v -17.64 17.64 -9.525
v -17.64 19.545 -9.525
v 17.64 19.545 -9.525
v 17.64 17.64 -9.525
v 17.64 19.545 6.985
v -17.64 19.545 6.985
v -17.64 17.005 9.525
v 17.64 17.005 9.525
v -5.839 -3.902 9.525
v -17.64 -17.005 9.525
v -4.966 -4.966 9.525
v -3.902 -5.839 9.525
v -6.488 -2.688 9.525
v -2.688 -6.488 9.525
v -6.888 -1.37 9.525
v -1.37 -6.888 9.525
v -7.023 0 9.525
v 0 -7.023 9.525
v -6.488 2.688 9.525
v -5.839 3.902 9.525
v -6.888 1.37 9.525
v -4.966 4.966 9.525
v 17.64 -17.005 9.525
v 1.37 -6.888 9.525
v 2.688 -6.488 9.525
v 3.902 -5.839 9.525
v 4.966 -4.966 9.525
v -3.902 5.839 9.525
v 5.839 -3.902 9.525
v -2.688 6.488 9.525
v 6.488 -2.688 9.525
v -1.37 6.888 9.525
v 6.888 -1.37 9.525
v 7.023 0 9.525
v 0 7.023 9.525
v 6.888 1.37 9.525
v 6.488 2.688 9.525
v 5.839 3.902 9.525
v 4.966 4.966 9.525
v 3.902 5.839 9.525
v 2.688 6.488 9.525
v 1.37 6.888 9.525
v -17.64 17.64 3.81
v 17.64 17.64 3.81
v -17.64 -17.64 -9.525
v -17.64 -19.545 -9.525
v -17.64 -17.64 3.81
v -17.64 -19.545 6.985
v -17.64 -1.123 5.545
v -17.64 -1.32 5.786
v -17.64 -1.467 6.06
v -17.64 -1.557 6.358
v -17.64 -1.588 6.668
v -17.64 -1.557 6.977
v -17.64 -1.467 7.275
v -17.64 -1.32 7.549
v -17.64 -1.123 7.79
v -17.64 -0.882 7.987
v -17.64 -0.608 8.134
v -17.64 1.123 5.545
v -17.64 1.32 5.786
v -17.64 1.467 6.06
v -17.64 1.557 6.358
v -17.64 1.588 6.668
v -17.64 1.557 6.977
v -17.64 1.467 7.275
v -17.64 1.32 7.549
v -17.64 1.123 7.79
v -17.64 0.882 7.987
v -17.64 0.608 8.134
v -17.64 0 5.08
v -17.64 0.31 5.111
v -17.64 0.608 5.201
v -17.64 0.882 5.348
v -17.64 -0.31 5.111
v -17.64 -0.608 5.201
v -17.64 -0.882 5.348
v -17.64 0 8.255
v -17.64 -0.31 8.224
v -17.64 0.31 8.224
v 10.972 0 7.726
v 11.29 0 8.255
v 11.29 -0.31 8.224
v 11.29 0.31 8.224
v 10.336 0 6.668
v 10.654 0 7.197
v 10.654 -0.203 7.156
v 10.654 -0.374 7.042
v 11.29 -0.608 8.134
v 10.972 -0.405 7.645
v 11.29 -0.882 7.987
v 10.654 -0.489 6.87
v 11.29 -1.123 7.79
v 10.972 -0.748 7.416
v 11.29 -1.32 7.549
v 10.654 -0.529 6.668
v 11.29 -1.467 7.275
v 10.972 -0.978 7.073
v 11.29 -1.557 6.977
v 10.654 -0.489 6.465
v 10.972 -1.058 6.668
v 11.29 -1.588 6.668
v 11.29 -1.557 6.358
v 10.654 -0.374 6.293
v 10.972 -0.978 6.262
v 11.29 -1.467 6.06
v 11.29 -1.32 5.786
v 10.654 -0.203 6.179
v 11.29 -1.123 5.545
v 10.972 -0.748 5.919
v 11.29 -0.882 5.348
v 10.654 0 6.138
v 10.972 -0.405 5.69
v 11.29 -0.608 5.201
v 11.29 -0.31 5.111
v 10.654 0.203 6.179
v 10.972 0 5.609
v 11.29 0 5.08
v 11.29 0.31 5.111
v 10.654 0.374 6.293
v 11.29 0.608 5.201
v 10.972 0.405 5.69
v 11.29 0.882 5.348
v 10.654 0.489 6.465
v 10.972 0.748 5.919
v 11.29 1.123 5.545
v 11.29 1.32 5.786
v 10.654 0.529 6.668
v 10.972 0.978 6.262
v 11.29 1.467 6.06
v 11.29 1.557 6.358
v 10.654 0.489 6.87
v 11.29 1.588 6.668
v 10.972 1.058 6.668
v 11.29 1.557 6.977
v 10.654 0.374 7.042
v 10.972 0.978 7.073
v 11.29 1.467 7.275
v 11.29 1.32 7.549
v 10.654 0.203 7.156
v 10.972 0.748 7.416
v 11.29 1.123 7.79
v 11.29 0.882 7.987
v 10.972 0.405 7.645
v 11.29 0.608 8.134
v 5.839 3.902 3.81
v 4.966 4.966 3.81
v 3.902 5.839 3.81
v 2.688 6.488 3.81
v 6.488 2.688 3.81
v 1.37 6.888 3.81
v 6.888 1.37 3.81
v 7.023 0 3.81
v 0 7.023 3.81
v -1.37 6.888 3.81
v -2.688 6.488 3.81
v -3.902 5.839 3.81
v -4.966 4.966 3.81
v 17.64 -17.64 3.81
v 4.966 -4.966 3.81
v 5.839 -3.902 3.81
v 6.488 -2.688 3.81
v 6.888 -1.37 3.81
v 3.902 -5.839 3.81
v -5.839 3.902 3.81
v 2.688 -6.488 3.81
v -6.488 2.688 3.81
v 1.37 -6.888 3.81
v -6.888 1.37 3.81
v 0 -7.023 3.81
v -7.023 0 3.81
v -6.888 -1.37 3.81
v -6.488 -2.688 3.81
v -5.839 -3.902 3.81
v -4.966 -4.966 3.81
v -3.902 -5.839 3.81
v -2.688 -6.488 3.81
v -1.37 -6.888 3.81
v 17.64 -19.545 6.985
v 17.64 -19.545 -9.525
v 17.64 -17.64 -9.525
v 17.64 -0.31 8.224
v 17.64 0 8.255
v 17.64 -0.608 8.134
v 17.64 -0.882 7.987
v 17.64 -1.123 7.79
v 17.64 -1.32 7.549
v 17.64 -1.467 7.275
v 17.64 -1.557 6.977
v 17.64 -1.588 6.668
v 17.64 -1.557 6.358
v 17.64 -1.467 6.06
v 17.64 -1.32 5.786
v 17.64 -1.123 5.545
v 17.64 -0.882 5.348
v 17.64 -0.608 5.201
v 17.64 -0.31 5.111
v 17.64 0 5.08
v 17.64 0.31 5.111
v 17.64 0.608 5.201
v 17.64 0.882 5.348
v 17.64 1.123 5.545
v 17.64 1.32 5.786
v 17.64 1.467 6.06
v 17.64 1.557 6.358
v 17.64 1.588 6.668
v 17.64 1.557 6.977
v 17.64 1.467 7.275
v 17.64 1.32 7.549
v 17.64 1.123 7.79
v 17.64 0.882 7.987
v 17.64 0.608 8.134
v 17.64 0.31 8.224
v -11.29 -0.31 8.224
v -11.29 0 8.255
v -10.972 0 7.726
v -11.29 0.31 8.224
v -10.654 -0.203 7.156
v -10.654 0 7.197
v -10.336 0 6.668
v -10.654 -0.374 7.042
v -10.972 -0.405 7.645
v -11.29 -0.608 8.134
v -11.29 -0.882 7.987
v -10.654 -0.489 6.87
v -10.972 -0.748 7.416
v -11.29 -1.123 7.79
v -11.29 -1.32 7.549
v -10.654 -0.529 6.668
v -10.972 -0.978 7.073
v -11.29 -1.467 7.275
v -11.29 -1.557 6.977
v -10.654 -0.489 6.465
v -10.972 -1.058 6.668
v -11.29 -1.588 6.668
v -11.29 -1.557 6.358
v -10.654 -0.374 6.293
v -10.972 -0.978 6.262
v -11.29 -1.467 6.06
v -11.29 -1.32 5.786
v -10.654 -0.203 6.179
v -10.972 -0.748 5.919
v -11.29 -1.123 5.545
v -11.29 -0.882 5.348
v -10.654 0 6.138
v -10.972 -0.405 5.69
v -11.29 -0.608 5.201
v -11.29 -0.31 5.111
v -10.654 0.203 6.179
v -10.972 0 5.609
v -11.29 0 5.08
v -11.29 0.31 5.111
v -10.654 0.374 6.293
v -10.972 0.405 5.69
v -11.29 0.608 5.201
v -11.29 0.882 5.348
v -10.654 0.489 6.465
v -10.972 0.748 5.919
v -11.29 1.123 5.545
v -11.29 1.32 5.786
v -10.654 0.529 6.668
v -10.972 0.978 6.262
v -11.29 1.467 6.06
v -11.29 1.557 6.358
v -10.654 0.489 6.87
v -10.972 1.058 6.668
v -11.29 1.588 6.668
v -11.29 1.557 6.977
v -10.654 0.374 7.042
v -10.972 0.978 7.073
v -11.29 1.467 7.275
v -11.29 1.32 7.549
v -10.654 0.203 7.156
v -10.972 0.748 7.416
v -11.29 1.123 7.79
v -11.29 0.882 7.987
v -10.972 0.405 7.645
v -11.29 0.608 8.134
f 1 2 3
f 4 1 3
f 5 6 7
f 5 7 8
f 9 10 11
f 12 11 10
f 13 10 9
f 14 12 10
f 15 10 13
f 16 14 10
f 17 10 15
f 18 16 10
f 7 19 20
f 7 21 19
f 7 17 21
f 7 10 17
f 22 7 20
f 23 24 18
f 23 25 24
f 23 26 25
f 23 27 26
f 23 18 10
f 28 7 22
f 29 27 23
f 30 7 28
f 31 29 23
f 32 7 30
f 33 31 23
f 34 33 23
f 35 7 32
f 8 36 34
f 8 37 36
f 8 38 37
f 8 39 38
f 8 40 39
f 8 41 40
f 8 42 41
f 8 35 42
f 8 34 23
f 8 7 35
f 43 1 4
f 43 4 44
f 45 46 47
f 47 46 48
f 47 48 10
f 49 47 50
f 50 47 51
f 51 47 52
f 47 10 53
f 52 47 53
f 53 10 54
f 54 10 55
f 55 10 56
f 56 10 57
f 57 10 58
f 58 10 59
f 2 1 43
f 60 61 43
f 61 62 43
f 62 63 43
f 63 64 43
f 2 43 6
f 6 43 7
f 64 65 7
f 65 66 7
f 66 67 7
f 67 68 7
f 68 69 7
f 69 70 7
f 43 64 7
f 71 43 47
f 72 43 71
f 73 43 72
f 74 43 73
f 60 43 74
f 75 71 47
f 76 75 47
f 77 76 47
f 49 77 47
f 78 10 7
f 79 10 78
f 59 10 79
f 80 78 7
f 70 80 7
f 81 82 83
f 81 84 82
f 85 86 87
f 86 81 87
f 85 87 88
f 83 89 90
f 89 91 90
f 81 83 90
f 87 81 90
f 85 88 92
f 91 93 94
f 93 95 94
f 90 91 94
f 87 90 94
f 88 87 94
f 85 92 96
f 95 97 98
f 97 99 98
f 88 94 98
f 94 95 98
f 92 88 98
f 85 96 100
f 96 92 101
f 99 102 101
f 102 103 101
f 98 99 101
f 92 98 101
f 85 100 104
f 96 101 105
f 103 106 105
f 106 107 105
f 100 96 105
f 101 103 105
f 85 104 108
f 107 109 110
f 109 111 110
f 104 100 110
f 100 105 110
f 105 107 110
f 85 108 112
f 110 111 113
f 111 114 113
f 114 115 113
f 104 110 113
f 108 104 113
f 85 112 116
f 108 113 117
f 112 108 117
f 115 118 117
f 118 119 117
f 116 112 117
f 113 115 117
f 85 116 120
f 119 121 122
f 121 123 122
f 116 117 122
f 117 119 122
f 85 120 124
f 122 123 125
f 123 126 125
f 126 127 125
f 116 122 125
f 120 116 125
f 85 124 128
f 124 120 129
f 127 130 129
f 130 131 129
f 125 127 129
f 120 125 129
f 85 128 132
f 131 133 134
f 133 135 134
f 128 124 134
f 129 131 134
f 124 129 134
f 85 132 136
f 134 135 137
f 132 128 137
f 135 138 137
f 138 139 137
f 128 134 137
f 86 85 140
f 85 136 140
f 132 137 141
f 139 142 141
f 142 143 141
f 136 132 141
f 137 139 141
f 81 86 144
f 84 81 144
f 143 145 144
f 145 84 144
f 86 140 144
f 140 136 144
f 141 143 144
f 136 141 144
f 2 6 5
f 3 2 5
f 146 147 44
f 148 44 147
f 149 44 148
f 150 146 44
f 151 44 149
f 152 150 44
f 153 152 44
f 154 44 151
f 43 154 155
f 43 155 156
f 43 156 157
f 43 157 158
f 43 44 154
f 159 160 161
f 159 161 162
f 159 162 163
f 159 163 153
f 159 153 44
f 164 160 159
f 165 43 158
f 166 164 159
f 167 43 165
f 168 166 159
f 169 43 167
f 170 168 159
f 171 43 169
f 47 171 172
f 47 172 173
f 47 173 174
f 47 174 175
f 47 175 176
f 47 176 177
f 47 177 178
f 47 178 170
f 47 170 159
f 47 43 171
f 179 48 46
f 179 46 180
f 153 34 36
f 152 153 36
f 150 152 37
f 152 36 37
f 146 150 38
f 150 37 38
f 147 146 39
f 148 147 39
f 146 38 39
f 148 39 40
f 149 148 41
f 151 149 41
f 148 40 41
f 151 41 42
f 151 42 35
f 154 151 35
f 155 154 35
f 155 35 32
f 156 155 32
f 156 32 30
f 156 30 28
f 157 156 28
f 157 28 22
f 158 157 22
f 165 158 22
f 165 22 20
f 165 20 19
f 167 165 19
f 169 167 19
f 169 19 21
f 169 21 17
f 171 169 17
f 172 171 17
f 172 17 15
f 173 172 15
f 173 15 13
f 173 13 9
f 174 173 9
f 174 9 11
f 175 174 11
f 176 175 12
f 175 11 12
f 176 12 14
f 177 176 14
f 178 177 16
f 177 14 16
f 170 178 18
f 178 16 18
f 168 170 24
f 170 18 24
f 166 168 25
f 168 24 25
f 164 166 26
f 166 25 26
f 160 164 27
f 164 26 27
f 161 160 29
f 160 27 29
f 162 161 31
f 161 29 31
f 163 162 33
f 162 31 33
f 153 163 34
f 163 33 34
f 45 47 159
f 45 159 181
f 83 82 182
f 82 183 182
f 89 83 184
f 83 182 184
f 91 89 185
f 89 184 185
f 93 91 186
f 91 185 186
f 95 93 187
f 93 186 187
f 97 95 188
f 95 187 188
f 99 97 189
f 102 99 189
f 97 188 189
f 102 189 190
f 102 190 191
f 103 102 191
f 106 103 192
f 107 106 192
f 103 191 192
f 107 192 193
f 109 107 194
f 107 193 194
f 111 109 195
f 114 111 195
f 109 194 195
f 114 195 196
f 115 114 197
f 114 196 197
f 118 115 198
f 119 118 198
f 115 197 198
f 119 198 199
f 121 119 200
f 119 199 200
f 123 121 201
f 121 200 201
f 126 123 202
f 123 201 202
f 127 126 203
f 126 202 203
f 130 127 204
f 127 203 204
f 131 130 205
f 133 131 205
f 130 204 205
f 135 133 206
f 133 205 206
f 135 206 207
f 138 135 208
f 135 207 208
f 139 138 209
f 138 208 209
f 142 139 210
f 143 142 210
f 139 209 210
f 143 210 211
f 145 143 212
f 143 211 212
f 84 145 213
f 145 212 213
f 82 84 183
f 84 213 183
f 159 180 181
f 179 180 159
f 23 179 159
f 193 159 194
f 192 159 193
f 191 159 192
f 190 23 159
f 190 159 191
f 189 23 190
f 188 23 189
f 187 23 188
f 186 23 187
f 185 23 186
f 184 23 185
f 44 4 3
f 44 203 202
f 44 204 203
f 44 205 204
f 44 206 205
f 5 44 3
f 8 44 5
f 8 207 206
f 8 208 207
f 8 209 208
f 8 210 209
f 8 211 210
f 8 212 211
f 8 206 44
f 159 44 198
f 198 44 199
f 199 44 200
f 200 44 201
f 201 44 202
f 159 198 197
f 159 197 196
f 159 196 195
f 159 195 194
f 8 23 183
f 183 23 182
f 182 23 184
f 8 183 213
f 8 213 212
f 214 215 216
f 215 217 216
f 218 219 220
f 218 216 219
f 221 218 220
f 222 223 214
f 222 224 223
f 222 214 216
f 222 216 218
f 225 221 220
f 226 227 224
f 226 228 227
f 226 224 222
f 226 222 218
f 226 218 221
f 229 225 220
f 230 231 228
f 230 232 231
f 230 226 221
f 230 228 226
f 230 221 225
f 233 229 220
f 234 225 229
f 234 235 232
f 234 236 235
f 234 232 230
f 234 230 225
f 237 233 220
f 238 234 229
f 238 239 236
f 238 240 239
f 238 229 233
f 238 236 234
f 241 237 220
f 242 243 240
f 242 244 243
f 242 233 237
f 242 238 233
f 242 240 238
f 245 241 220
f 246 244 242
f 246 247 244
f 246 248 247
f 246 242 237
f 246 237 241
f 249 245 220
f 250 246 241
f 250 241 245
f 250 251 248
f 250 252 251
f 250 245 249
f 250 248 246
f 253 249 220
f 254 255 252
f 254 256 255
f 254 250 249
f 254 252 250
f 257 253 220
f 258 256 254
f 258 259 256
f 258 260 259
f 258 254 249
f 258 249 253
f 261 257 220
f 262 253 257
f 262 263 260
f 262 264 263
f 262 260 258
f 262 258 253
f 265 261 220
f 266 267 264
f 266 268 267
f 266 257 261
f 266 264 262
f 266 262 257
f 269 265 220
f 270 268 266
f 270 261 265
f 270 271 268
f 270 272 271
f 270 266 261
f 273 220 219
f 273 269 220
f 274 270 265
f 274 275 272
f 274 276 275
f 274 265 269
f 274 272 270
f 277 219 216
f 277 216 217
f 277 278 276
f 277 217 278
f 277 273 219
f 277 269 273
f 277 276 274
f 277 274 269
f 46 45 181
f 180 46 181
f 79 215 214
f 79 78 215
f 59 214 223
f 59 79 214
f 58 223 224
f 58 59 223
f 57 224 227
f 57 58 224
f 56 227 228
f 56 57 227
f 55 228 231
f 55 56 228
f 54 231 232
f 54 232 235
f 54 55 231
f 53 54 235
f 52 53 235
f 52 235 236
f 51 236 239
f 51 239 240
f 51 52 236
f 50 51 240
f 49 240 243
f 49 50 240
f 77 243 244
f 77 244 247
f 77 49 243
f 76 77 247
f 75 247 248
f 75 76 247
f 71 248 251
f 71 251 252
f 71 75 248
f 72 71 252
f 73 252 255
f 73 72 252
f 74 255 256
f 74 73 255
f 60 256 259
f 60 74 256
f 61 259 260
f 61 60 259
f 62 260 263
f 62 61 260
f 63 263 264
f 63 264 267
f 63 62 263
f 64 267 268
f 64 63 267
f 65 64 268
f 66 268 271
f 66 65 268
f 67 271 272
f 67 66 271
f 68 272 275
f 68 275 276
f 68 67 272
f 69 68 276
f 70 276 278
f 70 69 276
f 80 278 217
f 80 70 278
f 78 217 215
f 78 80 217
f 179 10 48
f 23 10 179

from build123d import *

# Parameters (mm, degrees)
SKETCH1_W      = 35.2806
SKETCH1_H      = 39.0906
EXTRUDE1_DEPTH = 9.525
SKETCH2_R      = 7.0231
EXTRUDE2_DEPTH = 33.497714322
EXTRUDE4_DEPTH = 42.442310667
CHAMFER1_SIZE  = 2.54


with BuildPart() as part:
    # Sketch1 → Extrude1 (new, symmetric)
    with BuildSketch(Plane.XY):
        Rectangle(SKETCH1_W, SKETCH1_H)
    extrude(amount=EXTRUDE1_DEPTH, both=True)

    # Sketch2 → Extrude2 (cut, through all)
    with BuildSketch(Plane.XY.offset(9.525)):
        Circle(SKETCH2_R)
    extrude(amount=-EXTRUDE2_DEPTH, mode=Mode.SUBTRACT)

    # Sketch3 → Extrude4 (cut, through all)
    with BuildSketch(Plane.ZY.offset(17.6403)):
        Polygon((-9.525, 17.6403), (3.81, 17.6403), (3.81, -17.6403), (-9.525, -17.6403), (-9.525, 0), align=None)
    extrude(amount=-EXTRUDE4_DEPTH, mode=Mode.SUBTRACT)

    # Sketch5 → 1/8 (0.125) Diameter Hole1 (revolve, cut)
    with BuildSketch(Plane(origin=(-17.6403, 0, 6.6675), x_dir=(0, 0, 1), z_dir=(0, 1, 0))):
        Polygon((0, 0), (0, 7.303866233), (1.5875, 6.35), (1.5875, 0), align=None)
    f_1_8_0_125_diameter_hole1 = revolve(axis=Axis((-23.9903, 0, 6.6675), (1, 0, 0)), mode=Mode.SUBTRACT)

    # Mirror1: 1/8 (0.125) Diameter Hole1 across plane
    add(f_1_8_0_125_diameter_hole1.mirror(Plane(origin=(0, 0, 0), x_dir=(0, 0, 1), z_dir=(1, 0, 0))), mode=Mode.SUBTRACT)

    # Chamfer1
    chamfer1_edges = [part.edges().sort_by_distance(p)[0] for p in [
        (0, -19.5453, 9.525),
        (0, 19.5453, 9.525),
    ]]
    chamfer(chamfer1_edges, length=CHAMFER1_SIZE)


solid = part.part
